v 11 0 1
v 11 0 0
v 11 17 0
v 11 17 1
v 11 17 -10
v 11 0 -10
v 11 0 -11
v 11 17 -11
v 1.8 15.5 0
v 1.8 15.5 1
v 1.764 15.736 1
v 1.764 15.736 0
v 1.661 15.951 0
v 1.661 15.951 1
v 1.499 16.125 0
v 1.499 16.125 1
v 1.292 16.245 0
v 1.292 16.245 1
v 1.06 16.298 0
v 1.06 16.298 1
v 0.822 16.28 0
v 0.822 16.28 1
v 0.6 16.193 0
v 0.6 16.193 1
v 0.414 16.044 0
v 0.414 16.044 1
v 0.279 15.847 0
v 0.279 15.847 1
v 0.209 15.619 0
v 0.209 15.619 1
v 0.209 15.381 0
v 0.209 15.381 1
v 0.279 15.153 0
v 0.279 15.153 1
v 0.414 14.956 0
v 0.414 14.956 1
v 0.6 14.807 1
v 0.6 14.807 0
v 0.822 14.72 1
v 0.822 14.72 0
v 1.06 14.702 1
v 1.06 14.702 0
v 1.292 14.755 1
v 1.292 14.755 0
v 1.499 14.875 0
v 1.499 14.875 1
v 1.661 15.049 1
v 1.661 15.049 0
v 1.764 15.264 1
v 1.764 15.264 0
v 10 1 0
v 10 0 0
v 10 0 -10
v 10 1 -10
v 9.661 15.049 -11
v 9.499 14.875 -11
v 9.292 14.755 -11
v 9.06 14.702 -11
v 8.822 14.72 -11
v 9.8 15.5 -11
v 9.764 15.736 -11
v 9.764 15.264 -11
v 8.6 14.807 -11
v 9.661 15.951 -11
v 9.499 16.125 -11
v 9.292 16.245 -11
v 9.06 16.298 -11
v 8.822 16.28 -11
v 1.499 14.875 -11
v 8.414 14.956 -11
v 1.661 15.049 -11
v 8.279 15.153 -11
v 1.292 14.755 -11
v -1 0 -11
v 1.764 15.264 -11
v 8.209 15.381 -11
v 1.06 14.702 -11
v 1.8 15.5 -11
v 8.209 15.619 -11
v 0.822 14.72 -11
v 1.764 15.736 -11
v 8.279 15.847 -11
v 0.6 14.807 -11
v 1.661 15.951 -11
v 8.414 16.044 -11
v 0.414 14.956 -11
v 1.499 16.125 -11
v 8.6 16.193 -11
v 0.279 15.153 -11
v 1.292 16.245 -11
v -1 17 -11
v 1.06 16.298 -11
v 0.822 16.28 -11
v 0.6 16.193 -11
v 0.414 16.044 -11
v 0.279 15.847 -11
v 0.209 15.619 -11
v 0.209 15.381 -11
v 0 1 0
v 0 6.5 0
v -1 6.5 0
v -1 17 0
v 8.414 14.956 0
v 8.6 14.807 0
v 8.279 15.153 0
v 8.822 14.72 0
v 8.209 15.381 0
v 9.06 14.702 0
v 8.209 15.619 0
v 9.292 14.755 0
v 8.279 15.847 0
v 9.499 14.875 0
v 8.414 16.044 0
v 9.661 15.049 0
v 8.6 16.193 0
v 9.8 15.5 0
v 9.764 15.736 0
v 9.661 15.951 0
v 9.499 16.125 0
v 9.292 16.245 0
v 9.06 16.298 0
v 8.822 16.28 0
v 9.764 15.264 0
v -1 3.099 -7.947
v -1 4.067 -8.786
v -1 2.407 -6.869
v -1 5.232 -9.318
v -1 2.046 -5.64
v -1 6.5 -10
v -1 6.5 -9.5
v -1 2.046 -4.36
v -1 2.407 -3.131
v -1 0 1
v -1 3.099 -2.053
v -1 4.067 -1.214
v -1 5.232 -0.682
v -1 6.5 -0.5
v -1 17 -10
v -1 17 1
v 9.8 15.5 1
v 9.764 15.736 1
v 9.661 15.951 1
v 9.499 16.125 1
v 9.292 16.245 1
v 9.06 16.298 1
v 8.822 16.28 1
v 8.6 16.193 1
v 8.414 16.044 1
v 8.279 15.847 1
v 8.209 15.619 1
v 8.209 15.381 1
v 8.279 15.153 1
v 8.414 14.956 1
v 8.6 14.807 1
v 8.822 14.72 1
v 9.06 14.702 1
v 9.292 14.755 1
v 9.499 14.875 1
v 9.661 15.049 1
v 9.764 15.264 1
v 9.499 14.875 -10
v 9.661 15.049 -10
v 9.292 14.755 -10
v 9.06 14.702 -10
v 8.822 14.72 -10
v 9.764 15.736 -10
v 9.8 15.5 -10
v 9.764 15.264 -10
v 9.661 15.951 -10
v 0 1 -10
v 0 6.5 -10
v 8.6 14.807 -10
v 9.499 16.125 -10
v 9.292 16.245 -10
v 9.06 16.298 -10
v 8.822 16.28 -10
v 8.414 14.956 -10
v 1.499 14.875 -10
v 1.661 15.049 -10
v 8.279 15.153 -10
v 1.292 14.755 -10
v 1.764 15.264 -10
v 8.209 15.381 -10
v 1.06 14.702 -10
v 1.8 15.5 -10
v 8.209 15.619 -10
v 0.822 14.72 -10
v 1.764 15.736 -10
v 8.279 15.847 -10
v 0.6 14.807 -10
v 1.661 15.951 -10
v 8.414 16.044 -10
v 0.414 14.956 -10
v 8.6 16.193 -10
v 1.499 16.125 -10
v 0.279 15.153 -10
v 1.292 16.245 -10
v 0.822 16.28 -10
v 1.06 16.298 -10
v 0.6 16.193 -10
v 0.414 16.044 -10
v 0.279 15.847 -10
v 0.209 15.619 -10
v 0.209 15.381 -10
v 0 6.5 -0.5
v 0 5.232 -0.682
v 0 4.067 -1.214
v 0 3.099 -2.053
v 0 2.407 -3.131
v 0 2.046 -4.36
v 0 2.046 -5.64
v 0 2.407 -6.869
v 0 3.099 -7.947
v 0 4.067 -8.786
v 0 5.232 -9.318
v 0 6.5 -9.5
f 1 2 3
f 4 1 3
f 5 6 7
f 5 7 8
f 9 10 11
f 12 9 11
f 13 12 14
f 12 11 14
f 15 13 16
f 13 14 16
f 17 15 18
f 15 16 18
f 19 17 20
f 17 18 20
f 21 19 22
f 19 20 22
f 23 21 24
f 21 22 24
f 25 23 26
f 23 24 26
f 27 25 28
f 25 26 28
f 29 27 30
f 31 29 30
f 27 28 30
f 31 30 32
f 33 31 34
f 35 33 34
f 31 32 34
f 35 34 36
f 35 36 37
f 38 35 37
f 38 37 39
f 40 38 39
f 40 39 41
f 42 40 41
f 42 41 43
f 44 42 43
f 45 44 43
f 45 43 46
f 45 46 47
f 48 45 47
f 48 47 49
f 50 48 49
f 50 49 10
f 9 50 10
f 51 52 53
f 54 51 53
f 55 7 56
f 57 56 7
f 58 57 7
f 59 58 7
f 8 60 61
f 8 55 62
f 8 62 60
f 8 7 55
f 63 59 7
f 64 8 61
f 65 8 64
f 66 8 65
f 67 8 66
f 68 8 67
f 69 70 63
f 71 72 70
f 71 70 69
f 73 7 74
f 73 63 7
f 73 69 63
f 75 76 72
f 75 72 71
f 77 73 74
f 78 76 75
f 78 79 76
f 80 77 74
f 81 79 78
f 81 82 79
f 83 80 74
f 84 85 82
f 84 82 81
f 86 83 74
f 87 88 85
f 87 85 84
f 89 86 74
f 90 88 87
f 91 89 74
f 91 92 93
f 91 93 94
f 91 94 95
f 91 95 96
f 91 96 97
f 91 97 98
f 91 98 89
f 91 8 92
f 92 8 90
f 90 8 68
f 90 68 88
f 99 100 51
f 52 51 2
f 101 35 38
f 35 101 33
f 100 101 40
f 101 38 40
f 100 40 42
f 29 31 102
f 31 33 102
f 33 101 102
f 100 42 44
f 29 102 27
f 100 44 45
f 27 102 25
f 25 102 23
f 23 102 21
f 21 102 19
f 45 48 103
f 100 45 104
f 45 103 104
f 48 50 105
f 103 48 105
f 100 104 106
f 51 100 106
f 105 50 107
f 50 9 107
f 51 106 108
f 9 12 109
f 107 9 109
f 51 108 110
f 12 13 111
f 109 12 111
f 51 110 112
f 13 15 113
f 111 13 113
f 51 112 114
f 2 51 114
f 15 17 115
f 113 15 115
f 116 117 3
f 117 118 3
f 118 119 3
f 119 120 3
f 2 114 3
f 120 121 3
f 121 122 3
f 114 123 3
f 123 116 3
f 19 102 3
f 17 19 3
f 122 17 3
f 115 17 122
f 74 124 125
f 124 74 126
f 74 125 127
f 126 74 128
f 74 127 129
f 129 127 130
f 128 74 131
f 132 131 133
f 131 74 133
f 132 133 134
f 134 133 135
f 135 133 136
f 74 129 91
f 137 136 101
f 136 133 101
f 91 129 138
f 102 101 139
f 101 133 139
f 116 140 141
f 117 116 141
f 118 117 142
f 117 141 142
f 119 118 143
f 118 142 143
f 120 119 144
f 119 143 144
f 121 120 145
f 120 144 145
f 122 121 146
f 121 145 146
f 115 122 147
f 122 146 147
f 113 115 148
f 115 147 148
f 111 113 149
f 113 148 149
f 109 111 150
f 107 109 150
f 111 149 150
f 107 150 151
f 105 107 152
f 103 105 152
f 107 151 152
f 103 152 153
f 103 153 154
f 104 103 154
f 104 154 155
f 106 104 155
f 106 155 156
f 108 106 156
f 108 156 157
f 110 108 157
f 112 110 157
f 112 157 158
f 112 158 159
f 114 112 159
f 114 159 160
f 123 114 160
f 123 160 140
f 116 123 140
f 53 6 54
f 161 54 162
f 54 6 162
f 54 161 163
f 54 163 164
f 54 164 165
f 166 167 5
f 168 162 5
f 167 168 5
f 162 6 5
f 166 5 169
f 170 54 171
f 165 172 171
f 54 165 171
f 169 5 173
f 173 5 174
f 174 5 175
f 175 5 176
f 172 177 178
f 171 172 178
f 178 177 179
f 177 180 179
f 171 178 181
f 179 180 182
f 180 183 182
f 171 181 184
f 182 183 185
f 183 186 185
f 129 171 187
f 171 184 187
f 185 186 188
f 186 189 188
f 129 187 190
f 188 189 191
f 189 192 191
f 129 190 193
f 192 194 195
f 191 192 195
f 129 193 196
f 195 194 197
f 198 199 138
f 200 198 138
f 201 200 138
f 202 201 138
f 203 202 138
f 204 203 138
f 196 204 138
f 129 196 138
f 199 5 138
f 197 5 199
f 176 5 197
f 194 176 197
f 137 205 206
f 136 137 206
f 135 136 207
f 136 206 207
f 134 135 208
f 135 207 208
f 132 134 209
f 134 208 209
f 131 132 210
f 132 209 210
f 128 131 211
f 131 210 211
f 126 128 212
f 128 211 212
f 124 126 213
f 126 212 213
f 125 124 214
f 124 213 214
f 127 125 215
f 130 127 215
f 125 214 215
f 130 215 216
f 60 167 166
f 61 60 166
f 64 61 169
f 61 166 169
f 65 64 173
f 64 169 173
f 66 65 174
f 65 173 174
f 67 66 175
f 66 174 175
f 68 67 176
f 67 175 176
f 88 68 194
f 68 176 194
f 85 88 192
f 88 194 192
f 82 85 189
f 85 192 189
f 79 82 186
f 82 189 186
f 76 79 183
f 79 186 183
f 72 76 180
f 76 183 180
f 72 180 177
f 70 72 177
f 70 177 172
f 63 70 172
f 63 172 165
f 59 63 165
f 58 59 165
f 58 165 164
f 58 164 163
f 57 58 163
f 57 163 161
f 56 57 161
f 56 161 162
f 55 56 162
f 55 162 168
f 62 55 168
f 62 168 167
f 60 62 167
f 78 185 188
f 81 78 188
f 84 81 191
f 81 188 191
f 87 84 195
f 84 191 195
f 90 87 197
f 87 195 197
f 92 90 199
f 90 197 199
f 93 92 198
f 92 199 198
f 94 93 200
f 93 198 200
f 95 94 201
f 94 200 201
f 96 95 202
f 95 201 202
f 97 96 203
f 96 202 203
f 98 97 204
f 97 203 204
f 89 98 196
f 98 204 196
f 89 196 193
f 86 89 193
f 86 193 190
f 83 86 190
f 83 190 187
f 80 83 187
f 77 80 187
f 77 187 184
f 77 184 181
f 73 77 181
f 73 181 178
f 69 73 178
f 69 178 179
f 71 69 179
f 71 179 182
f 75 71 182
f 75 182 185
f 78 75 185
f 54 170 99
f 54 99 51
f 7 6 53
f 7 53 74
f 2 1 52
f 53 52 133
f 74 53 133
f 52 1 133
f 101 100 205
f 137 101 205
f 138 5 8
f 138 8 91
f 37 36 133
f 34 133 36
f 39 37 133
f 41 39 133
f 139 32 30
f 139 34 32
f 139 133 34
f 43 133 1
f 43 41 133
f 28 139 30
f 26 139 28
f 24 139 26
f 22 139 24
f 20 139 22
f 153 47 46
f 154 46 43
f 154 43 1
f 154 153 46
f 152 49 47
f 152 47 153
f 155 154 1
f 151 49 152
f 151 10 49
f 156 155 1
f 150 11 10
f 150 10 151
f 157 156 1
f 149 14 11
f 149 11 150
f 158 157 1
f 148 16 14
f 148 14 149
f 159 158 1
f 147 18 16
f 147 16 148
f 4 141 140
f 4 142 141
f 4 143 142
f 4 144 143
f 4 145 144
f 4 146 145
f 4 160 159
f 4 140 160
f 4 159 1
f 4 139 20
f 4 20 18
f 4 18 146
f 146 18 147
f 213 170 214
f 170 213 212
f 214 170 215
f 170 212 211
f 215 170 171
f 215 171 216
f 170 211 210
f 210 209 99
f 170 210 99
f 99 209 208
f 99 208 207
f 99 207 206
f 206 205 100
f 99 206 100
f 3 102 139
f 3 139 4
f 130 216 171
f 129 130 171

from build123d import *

# Parameters (mm, degrees)
SKETCH_1_W         = 10
SKETCH_1_H         = 10
EXTRUDE_1_DEPTH    = 1
EXTRUDE_2_DEPTH    = 1
SKETCH_4_W         = 12
SKETCH_4_H         = 17
EXTRUDE_4_DEPTH    = 1
SKETCH_5_W         = 12
SKETCH_5_H         = 17
EXTRUDE_5_DEPTH    = 1
HOLE_WIZARD_M2_1_D = 1.6


with BuildPart() as part:
    # 草图1 → 凸台-拉伸1 (new body)
    with BuildSketch(Plane(origin=(0, 0, 0), x_dir=(1, 0, 0), z_dir=(0, 1, 0))):
        with Locations((5, 5)):
            Rectangle(SKETCH_1_W, SKETCH_1_H)
    extrude(amount=EXTRUDE_1_DEPTH)

    # 草图2 → 凸台-拉伸2 (add)
    with BuildSketch(Plane.ZY):
        with BuildLine():
            Line((-9.5, 6.5), (-10, 6.5))
            Line((-10, 6.5), (-10, 0))
            Line((-10, 0), (0, 0))
            Line((0, 0), (0, 6.5))
            Line((0, 6.5), (-0.5, 6.5))
            ThreePointArc((-0.5, 6.5), (-5, 2), (-9.5, 6.5))
        make_face()
    extrude(amount=EXTRUDE_2_DEPTH)

    # 草图4 → 凸台-拉伸4 (add)
    with BuildSketch(Plane.XY):
        with Locations((5, 8.5)):
            Rectangle(SKETCH_4_W, SKETCH_4_H)
    extrude(amount=EXTRUDE_4_DEPTH)

    # 草图5 → 凸台-拉伸5 (add)
    with BuildSketch(Plane(origin=(0, 0, -10), x_dir=(-1, 0, 0), z_dir=(0, 0, -1))):
        with Locations((-5, 8.5)):
            Rectangle(SKETCH_5_W, SKETCH_5_H)
    extrude(amount=EXTRUDE_5_DEPTH)

    # M2 螺纹孔1 (through all)
    with Locations(Plane(origin=(0, 0, -11), x_dir=(-1, 0, 0), z_dir=(0, 0, -1))):
        with Locations((-9, 15.5), (-1, 15.5)):
            Hole(HOLE_WIZARD_M2_1_D / 2)


solid = part.part
